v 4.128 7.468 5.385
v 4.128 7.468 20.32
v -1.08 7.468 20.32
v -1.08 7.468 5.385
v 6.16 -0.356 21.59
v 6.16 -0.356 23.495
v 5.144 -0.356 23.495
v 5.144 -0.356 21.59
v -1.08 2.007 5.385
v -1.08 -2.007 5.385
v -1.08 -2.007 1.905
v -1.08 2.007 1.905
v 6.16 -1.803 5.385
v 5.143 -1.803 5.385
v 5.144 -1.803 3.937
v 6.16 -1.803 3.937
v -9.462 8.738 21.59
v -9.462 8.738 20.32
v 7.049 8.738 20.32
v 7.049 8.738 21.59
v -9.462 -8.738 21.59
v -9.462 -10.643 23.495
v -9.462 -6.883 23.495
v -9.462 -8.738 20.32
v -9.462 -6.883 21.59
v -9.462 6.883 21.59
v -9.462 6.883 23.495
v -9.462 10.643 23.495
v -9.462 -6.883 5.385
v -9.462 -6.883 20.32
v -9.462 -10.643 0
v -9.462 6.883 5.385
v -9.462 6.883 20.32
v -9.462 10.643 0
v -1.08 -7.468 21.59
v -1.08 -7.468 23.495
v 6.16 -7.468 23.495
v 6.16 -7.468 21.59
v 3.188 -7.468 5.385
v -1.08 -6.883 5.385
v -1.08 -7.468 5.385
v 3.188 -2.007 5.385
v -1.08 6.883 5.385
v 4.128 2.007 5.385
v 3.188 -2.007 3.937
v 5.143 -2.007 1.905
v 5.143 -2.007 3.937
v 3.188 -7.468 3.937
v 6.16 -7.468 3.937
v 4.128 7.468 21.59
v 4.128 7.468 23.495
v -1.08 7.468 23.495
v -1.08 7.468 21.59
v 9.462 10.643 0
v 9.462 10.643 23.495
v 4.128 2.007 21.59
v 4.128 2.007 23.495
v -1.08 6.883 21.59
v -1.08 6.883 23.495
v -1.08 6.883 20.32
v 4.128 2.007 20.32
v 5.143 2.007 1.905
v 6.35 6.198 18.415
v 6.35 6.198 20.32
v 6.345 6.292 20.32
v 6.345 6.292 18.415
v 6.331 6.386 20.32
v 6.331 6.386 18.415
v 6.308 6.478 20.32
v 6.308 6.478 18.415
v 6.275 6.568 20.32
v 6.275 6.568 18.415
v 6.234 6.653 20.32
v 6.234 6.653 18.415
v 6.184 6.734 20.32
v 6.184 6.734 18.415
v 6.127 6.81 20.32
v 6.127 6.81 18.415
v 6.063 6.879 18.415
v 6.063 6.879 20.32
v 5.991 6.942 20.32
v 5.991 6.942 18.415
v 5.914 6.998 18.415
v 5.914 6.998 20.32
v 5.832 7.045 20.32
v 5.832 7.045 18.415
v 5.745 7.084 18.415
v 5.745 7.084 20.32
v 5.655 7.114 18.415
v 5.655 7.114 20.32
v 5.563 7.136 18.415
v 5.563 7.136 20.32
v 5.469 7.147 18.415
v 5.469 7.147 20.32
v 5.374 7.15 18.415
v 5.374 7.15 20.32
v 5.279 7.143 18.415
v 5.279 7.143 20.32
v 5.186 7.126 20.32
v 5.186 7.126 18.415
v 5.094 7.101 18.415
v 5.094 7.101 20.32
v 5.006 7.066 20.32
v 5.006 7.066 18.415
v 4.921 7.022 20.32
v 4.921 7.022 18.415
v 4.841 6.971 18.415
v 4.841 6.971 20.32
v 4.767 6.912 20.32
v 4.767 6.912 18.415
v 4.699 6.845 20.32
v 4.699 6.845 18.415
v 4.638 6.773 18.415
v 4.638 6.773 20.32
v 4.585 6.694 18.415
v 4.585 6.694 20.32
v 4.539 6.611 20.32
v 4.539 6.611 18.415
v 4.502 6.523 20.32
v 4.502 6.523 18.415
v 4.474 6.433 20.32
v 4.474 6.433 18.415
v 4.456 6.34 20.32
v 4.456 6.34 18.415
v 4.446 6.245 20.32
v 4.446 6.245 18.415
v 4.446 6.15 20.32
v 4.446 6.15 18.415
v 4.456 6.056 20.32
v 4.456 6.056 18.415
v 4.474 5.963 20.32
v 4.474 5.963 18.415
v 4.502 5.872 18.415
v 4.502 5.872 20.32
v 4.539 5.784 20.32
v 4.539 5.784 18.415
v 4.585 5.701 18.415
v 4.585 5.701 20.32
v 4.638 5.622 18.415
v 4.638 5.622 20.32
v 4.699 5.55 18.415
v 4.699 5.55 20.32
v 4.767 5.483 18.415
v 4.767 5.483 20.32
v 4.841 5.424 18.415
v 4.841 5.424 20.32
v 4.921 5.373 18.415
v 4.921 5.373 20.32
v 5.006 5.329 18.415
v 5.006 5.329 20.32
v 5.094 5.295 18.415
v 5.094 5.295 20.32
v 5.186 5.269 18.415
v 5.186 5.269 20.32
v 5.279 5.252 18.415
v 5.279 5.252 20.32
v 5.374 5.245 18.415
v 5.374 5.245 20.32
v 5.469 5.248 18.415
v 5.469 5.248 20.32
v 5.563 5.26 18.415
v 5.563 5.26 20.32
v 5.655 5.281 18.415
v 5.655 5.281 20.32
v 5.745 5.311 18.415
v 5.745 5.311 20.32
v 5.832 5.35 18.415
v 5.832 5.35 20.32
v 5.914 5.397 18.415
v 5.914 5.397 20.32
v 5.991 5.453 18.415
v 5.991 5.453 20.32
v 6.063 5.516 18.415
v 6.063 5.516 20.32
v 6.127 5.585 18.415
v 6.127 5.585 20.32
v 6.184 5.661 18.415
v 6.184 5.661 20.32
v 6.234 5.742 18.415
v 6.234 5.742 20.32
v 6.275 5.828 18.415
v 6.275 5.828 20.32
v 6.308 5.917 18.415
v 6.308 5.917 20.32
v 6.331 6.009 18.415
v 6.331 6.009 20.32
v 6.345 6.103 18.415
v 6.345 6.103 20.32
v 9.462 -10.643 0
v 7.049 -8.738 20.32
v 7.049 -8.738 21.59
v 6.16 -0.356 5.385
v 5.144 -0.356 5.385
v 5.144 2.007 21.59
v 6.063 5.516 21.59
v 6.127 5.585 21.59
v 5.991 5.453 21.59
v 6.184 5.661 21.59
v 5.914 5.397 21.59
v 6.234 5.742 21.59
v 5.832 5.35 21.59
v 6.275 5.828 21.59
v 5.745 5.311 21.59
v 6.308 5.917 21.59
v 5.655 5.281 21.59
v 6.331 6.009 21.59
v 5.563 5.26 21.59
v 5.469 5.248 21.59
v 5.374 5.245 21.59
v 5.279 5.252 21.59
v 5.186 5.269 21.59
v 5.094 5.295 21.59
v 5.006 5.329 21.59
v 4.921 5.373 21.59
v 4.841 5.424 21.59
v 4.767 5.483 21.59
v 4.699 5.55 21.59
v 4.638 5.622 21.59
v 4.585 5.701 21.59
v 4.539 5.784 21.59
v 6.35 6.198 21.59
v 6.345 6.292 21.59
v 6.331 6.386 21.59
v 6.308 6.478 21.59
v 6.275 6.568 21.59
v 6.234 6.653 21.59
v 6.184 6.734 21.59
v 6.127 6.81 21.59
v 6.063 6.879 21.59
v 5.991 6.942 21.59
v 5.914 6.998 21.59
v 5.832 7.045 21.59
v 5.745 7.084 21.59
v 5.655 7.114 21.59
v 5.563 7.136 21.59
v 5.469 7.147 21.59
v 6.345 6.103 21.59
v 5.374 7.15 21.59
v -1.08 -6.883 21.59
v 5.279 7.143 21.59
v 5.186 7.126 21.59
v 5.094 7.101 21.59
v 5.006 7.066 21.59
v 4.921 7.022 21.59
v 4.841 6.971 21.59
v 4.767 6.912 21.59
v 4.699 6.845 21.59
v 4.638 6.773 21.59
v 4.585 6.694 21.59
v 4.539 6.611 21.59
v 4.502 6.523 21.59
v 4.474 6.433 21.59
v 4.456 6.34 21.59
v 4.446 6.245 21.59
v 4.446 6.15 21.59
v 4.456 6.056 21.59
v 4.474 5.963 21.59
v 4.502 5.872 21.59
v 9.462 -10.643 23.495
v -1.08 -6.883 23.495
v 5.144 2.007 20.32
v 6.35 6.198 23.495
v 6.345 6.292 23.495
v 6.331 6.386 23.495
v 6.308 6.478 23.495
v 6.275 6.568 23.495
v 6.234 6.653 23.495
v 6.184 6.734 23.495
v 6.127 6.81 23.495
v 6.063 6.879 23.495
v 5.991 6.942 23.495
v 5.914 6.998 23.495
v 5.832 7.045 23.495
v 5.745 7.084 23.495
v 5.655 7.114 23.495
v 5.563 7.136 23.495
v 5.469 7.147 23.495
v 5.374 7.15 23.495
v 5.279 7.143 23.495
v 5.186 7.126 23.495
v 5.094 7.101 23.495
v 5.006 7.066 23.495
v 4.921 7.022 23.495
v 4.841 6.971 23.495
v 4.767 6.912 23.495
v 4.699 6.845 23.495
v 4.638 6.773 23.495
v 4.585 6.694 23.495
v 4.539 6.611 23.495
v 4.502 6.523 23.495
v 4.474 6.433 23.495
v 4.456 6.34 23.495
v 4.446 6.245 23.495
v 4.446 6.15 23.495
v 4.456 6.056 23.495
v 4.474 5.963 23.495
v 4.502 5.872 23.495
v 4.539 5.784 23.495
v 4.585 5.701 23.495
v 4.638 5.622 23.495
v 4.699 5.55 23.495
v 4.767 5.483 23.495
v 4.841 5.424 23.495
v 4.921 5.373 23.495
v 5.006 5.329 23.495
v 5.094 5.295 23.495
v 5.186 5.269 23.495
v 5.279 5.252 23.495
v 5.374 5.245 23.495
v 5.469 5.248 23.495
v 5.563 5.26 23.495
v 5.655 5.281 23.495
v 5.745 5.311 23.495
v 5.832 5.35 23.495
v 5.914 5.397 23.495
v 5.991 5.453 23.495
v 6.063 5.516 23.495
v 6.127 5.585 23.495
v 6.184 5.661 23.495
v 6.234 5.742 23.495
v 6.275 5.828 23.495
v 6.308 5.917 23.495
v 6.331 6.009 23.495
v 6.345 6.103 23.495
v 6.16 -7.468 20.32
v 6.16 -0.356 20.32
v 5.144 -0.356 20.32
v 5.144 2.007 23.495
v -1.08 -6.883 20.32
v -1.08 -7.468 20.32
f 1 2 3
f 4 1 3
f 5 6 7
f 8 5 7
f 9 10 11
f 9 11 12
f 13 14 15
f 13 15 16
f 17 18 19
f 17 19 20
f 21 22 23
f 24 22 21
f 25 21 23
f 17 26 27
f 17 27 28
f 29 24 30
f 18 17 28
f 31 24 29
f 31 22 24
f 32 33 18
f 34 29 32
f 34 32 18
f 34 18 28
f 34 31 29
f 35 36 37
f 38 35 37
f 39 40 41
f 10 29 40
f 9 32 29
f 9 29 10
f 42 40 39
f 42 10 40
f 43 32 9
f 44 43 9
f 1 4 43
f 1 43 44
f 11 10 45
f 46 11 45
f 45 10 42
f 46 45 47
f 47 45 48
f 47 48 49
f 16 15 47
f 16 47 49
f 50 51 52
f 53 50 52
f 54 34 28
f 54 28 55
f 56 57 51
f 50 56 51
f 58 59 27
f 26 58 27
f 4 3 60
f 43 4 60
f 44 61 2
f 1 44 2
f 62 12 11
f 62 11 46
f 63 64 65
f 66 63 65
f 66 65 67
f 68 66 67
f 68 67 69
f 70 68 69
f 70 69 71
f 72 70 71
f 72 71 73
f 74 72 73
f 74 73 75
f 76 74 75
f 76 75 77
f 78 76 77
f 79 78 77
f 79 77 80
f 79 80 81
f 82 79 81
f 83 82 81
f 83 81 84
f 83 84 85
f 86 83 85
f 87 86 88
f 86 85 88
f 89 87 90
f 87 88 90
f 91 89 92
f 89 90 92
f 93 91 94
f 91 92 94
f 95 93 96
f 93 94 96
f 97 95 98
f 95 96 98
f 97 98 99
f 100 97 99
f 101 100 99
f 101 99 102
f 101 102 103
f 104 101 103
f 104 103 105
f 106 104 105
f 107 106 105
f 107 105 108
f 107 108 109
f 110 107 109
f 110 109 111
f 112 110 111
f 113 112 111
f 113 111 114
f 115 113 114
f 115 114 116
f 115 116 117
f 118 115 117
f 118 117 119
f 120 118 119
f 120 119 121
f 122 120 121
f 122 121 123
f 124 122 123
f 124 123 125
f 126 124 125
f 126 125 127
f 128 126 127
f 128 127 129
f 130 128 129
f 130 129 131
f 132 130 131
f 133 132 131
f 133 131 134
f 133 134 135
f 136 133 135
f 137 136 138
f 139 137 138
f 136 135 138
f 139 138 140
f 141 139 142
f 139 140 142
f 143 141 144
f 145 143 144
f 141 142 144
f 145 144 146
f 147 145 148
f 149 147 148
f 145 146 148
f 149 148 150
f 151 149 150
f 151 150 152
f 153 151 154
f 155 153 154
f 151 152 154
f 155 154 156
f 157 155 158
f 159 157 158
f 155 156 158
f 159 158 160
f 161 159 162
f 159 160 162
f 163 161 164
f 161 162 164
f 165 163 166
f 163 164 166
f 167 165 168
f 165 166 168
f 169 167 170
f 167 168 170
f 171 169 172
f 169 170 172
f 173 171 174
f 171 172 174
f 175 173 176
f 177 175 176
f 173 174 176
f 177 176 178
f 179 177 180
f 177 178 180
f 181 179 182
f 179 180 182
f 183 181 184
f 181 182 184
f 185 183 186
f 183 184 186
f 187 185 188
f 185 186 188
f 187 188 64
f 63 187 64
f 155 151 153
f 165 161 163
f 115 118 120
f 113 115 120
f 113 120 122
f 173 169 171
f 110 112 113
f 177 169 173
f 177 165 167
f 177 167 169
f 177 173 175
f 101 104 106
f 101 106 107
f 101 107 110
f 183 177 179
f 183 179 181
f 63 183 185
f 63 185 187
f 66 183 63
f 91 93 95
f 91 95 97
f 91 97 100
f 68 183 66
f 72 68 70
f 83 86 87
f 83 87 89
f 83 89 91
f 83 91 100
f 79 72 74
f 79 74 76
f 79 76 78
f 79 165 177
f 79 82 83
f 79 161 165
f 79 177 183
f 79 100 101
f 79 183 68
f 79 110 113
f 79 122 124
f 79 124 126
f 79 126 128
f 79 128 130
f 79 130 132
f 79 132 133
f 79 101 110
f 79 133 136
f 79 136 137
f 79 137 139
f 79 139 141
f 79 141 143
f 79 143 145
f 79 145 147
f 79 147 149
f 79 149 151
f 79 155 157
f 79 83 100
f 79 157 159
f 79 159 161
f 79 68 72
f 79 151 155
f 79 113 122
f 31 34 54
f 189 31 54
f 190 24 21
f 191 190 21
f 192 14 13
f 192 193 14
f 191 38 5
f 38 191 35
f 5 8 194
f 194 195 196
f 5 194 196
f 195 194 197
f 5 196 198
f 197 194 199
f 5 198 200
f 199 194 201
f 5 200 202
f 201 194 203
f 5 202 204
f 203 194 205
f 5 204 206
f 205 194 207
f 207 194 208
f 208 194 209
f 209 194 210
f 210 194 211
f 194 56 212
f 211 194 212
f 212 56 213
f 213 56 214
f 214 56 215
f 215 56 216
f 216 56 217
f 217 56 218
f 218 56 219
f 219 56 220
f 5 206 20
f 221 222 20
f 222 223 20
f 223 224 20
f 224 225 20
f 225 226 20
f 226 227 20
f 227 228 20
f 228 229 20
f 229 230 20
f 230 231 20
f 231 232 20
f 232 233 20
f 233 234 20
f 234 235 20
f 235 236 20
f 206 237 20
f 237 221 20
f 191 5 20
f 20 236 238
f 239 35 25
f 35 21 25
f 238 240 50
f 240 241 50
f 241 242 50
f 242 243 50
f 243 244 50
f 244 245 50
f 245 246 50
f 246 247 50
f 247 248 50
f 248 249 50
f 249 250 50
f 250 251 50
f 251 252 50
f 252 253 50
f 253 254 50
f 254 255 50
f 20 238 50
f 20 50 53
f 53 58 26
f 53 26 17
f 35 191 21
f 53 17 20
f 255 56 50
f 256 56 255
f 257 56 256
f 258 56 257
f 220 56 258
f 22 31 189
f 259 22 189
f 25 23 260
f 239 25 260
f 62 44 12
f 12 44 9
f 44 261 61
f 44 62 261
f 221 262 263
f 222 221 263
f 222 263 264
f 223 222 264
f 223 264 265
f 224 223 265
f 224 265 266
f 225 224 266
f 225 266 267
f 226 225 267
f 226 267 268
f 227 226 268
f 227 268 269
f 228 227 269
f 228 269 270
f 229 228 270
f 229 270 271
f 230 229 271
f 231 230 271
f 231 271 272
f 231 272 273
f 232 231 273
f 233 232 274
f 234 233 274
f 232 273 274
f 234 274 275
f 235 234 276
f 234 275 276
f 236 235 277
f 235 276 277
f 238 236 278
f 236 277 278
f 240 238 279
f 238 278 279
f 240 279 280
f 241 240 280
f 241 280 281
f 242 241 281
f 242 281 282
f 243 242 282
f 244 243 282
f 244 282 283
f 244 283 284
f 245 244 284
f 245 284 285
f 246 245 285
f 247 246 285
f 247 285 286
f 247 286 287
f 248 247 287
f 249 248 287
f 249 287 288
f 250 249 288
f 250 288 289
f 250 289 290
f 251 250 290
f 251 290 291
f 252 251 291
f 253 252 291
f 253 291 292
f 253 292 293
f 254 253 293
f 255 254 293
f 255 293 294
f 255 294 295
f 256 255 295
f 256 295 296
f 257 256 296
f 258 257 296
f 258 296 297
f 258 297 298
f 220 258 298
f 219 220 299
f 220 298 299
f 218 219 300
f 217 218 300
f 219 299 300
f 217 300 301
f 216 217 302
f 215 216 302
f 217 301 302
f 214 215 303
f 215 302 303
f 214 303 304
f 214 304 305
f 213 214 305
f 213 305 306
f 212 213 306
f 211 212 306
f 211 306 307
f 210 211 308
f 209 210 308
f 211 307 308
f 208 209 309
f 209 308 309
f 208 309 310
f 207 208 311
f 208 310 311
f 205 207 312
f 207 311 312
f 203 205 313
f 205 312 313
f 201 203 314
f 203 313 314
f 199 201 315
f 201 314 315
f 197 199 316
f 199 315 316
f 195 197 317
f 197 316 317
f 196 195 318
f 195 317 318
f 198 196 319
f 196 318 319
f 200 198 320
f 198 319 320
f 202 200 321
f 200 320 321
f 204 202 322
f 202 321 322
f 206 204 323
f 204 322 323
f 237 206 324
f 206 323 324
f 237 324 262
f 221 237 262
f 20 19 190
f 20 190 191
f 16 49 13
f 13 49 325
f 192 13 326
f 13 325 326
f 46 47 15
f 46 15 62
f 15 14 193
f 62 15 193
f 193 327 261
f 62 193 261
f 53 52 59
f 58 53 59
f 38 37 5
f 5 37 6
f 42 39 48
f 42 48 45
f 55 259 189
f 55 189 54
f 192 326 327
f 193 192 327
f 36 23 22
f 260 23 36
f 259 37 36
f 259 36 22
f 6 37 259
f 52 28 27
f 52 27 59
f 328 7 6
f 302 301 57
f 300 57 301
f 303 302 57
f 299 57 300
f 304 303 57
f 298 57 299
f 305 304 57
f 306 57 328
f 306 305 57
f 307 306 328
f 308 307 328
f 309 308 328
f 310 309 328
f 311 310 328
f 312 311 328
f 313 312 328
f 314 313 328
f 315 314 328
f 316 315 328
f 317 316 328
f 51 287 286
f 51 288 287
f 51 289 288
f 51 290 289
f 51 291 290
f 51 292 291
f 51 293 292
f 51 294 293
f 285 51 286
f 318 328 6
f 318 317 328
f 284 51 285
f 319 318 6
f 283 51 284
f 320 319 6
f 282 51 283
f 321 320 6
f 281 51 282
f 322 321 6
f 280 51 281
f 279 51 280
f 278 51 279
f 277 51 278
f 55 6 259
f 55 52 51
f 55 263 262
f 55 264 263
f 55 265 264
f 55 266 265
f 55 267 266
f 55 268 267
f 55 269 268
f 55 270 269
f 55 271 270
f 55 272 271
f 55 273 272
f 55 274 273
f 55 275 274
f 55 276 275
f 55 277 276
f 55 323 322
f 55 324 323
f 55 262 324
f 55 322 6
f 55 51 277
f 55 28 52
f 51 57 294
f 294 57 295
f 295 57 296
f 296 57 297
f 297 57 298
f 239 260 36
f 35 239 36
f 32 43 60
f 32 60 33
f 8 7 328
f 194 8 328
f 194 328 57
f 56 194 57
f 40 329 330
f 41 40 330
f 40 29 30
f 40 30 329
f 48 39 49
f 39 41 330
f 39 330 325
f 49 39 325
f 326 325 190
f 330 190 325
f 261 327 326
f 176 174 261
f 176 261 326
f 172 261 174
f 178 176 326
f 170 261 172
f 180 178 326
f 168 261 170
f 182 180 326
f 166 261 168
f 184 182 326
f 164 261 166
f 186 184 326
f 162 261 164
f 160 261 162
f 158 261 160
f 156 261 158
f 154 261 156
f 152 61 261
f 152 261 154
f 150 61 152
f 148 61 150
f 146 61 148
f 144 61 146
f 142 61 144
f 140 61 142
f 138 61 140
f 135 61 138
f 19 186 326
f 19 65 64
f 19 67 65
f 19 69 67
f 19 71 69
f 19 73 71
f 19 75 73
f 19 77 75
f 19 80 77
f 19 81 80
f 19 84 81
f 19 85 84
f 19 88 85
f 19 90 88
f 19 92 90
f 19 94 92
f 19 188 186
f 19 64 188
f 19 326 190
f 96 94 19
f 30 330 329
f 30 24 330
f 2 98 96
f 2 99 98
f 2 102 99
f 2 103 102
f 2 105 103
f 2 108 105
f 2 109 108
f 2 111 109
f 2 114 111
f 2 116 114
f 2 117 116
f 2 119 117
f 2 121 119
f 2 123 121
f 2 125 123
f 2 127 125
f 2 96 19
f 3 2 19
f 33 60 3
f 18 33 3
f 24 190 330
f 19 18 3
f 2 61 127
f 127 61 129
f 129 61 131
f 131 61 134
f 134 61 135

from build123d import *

# Parameters (mm, degrees)
SKETCH1_W           = 18.923
SKETCH1_H           = 21.2852
BOSS_EXTRUDE1_DEPTH = 23.495
CUT_EXTRUDE1_DEPTH  = 18.1102
SKETCH3_W           = 6.223
SKETCH3_H           = 4.0132
CUT_EXTRUDE2_DEPTH  = 3.4798
SKETCH4_W           = 2.9718
SKETCH4_H           = 5.6642
CUT_EXTRUDE3_DEPTH  = 1.4478
SKETCH5_W           = 1.27
SKETCH5_H           = 17.4752
CUT_EXTRUDE4_DEPTH  = 16.51
SKETCH7_R           = 0.9525
CUT_EXTRUDE6_DEPTH  = 5.08


with BuildPart() as part:
    # Sketch1 → Boss-Extrude1 (new body)
    with BuildSketch(Plane.XY):
        Rectangle(SKETCH1_W, SKETCH1_H)
    extrude(amount=BOSS_EXTRUDE1_DEPTH)

    # Sketch2 → Cut-Extrude1 (cut)
    with BuildSketch(Plane.XY.offset(23.495)):
        Polygon((-9.4615, 6.8834), (-9.4615, -6.8834), (-1.0795, -6.8834), (-1.0795, -7.4676), (6.1595, -7.4676), (6.1595, -0.3556), (5.1435, -0.3556), (5.1435, 2.0066), (4.1275, 2.0066), (4.1275, 7.4676), (-1.0795, 7.4676), (-1.0795, 6.8834), align=None)
    extrude(amount=-CUT_EXTRUDE1_DEPTH, mode=Mode.SUBTRACT)

    # Sketch3 → Cut-Extrude2 (cut)
    with BuildSketch(Plane.XY.offset(5.3848)):
        with Locations((2.032, 0)):
            Rectangle(SKETCH3_W, SKETCH3_H)
    extrude(amount=-CUT_EXTRUDE2_DEPTH, mode=Mode.SUBTRACT)

    # Sketch4 → Cut-Extrude3 (cut)
    with BuildSketch(Plane.XY.offset(5.3848)):
        with Locations((4.6736, -4.6355)):
            Rectangle(SKETCH4_W, SKETCH4_H)
    extrude(amount=-CUT_EXTRUDE3_DEPTH, mode=Mode.SUBTRACT)

    # Sketch5 → Cut-Extrude4 (cut)
    with BuildSketch(Plane.ZY.offset(9.4615)):
        with Locations((20.955, 0)):
            Rectangle(SKETCH5_W, SKETCH5_H)
    extrude(amount=-CUT_EXTRUDE4_DEPTH, mode=Mode.SUBTRACT)

    # Sketch7 → Cut-Extrude6 (cut)
    with BuildSketch(Plane.XY.offset(23.495)):
        with Locations((5.3975, 6.1976)):
            Circle(SKETCH7_R)
    extrude(amount=-CUT_EXTRUDE6_DEPTH, mode=Mode.SUBTRACT)


solid = part.part
